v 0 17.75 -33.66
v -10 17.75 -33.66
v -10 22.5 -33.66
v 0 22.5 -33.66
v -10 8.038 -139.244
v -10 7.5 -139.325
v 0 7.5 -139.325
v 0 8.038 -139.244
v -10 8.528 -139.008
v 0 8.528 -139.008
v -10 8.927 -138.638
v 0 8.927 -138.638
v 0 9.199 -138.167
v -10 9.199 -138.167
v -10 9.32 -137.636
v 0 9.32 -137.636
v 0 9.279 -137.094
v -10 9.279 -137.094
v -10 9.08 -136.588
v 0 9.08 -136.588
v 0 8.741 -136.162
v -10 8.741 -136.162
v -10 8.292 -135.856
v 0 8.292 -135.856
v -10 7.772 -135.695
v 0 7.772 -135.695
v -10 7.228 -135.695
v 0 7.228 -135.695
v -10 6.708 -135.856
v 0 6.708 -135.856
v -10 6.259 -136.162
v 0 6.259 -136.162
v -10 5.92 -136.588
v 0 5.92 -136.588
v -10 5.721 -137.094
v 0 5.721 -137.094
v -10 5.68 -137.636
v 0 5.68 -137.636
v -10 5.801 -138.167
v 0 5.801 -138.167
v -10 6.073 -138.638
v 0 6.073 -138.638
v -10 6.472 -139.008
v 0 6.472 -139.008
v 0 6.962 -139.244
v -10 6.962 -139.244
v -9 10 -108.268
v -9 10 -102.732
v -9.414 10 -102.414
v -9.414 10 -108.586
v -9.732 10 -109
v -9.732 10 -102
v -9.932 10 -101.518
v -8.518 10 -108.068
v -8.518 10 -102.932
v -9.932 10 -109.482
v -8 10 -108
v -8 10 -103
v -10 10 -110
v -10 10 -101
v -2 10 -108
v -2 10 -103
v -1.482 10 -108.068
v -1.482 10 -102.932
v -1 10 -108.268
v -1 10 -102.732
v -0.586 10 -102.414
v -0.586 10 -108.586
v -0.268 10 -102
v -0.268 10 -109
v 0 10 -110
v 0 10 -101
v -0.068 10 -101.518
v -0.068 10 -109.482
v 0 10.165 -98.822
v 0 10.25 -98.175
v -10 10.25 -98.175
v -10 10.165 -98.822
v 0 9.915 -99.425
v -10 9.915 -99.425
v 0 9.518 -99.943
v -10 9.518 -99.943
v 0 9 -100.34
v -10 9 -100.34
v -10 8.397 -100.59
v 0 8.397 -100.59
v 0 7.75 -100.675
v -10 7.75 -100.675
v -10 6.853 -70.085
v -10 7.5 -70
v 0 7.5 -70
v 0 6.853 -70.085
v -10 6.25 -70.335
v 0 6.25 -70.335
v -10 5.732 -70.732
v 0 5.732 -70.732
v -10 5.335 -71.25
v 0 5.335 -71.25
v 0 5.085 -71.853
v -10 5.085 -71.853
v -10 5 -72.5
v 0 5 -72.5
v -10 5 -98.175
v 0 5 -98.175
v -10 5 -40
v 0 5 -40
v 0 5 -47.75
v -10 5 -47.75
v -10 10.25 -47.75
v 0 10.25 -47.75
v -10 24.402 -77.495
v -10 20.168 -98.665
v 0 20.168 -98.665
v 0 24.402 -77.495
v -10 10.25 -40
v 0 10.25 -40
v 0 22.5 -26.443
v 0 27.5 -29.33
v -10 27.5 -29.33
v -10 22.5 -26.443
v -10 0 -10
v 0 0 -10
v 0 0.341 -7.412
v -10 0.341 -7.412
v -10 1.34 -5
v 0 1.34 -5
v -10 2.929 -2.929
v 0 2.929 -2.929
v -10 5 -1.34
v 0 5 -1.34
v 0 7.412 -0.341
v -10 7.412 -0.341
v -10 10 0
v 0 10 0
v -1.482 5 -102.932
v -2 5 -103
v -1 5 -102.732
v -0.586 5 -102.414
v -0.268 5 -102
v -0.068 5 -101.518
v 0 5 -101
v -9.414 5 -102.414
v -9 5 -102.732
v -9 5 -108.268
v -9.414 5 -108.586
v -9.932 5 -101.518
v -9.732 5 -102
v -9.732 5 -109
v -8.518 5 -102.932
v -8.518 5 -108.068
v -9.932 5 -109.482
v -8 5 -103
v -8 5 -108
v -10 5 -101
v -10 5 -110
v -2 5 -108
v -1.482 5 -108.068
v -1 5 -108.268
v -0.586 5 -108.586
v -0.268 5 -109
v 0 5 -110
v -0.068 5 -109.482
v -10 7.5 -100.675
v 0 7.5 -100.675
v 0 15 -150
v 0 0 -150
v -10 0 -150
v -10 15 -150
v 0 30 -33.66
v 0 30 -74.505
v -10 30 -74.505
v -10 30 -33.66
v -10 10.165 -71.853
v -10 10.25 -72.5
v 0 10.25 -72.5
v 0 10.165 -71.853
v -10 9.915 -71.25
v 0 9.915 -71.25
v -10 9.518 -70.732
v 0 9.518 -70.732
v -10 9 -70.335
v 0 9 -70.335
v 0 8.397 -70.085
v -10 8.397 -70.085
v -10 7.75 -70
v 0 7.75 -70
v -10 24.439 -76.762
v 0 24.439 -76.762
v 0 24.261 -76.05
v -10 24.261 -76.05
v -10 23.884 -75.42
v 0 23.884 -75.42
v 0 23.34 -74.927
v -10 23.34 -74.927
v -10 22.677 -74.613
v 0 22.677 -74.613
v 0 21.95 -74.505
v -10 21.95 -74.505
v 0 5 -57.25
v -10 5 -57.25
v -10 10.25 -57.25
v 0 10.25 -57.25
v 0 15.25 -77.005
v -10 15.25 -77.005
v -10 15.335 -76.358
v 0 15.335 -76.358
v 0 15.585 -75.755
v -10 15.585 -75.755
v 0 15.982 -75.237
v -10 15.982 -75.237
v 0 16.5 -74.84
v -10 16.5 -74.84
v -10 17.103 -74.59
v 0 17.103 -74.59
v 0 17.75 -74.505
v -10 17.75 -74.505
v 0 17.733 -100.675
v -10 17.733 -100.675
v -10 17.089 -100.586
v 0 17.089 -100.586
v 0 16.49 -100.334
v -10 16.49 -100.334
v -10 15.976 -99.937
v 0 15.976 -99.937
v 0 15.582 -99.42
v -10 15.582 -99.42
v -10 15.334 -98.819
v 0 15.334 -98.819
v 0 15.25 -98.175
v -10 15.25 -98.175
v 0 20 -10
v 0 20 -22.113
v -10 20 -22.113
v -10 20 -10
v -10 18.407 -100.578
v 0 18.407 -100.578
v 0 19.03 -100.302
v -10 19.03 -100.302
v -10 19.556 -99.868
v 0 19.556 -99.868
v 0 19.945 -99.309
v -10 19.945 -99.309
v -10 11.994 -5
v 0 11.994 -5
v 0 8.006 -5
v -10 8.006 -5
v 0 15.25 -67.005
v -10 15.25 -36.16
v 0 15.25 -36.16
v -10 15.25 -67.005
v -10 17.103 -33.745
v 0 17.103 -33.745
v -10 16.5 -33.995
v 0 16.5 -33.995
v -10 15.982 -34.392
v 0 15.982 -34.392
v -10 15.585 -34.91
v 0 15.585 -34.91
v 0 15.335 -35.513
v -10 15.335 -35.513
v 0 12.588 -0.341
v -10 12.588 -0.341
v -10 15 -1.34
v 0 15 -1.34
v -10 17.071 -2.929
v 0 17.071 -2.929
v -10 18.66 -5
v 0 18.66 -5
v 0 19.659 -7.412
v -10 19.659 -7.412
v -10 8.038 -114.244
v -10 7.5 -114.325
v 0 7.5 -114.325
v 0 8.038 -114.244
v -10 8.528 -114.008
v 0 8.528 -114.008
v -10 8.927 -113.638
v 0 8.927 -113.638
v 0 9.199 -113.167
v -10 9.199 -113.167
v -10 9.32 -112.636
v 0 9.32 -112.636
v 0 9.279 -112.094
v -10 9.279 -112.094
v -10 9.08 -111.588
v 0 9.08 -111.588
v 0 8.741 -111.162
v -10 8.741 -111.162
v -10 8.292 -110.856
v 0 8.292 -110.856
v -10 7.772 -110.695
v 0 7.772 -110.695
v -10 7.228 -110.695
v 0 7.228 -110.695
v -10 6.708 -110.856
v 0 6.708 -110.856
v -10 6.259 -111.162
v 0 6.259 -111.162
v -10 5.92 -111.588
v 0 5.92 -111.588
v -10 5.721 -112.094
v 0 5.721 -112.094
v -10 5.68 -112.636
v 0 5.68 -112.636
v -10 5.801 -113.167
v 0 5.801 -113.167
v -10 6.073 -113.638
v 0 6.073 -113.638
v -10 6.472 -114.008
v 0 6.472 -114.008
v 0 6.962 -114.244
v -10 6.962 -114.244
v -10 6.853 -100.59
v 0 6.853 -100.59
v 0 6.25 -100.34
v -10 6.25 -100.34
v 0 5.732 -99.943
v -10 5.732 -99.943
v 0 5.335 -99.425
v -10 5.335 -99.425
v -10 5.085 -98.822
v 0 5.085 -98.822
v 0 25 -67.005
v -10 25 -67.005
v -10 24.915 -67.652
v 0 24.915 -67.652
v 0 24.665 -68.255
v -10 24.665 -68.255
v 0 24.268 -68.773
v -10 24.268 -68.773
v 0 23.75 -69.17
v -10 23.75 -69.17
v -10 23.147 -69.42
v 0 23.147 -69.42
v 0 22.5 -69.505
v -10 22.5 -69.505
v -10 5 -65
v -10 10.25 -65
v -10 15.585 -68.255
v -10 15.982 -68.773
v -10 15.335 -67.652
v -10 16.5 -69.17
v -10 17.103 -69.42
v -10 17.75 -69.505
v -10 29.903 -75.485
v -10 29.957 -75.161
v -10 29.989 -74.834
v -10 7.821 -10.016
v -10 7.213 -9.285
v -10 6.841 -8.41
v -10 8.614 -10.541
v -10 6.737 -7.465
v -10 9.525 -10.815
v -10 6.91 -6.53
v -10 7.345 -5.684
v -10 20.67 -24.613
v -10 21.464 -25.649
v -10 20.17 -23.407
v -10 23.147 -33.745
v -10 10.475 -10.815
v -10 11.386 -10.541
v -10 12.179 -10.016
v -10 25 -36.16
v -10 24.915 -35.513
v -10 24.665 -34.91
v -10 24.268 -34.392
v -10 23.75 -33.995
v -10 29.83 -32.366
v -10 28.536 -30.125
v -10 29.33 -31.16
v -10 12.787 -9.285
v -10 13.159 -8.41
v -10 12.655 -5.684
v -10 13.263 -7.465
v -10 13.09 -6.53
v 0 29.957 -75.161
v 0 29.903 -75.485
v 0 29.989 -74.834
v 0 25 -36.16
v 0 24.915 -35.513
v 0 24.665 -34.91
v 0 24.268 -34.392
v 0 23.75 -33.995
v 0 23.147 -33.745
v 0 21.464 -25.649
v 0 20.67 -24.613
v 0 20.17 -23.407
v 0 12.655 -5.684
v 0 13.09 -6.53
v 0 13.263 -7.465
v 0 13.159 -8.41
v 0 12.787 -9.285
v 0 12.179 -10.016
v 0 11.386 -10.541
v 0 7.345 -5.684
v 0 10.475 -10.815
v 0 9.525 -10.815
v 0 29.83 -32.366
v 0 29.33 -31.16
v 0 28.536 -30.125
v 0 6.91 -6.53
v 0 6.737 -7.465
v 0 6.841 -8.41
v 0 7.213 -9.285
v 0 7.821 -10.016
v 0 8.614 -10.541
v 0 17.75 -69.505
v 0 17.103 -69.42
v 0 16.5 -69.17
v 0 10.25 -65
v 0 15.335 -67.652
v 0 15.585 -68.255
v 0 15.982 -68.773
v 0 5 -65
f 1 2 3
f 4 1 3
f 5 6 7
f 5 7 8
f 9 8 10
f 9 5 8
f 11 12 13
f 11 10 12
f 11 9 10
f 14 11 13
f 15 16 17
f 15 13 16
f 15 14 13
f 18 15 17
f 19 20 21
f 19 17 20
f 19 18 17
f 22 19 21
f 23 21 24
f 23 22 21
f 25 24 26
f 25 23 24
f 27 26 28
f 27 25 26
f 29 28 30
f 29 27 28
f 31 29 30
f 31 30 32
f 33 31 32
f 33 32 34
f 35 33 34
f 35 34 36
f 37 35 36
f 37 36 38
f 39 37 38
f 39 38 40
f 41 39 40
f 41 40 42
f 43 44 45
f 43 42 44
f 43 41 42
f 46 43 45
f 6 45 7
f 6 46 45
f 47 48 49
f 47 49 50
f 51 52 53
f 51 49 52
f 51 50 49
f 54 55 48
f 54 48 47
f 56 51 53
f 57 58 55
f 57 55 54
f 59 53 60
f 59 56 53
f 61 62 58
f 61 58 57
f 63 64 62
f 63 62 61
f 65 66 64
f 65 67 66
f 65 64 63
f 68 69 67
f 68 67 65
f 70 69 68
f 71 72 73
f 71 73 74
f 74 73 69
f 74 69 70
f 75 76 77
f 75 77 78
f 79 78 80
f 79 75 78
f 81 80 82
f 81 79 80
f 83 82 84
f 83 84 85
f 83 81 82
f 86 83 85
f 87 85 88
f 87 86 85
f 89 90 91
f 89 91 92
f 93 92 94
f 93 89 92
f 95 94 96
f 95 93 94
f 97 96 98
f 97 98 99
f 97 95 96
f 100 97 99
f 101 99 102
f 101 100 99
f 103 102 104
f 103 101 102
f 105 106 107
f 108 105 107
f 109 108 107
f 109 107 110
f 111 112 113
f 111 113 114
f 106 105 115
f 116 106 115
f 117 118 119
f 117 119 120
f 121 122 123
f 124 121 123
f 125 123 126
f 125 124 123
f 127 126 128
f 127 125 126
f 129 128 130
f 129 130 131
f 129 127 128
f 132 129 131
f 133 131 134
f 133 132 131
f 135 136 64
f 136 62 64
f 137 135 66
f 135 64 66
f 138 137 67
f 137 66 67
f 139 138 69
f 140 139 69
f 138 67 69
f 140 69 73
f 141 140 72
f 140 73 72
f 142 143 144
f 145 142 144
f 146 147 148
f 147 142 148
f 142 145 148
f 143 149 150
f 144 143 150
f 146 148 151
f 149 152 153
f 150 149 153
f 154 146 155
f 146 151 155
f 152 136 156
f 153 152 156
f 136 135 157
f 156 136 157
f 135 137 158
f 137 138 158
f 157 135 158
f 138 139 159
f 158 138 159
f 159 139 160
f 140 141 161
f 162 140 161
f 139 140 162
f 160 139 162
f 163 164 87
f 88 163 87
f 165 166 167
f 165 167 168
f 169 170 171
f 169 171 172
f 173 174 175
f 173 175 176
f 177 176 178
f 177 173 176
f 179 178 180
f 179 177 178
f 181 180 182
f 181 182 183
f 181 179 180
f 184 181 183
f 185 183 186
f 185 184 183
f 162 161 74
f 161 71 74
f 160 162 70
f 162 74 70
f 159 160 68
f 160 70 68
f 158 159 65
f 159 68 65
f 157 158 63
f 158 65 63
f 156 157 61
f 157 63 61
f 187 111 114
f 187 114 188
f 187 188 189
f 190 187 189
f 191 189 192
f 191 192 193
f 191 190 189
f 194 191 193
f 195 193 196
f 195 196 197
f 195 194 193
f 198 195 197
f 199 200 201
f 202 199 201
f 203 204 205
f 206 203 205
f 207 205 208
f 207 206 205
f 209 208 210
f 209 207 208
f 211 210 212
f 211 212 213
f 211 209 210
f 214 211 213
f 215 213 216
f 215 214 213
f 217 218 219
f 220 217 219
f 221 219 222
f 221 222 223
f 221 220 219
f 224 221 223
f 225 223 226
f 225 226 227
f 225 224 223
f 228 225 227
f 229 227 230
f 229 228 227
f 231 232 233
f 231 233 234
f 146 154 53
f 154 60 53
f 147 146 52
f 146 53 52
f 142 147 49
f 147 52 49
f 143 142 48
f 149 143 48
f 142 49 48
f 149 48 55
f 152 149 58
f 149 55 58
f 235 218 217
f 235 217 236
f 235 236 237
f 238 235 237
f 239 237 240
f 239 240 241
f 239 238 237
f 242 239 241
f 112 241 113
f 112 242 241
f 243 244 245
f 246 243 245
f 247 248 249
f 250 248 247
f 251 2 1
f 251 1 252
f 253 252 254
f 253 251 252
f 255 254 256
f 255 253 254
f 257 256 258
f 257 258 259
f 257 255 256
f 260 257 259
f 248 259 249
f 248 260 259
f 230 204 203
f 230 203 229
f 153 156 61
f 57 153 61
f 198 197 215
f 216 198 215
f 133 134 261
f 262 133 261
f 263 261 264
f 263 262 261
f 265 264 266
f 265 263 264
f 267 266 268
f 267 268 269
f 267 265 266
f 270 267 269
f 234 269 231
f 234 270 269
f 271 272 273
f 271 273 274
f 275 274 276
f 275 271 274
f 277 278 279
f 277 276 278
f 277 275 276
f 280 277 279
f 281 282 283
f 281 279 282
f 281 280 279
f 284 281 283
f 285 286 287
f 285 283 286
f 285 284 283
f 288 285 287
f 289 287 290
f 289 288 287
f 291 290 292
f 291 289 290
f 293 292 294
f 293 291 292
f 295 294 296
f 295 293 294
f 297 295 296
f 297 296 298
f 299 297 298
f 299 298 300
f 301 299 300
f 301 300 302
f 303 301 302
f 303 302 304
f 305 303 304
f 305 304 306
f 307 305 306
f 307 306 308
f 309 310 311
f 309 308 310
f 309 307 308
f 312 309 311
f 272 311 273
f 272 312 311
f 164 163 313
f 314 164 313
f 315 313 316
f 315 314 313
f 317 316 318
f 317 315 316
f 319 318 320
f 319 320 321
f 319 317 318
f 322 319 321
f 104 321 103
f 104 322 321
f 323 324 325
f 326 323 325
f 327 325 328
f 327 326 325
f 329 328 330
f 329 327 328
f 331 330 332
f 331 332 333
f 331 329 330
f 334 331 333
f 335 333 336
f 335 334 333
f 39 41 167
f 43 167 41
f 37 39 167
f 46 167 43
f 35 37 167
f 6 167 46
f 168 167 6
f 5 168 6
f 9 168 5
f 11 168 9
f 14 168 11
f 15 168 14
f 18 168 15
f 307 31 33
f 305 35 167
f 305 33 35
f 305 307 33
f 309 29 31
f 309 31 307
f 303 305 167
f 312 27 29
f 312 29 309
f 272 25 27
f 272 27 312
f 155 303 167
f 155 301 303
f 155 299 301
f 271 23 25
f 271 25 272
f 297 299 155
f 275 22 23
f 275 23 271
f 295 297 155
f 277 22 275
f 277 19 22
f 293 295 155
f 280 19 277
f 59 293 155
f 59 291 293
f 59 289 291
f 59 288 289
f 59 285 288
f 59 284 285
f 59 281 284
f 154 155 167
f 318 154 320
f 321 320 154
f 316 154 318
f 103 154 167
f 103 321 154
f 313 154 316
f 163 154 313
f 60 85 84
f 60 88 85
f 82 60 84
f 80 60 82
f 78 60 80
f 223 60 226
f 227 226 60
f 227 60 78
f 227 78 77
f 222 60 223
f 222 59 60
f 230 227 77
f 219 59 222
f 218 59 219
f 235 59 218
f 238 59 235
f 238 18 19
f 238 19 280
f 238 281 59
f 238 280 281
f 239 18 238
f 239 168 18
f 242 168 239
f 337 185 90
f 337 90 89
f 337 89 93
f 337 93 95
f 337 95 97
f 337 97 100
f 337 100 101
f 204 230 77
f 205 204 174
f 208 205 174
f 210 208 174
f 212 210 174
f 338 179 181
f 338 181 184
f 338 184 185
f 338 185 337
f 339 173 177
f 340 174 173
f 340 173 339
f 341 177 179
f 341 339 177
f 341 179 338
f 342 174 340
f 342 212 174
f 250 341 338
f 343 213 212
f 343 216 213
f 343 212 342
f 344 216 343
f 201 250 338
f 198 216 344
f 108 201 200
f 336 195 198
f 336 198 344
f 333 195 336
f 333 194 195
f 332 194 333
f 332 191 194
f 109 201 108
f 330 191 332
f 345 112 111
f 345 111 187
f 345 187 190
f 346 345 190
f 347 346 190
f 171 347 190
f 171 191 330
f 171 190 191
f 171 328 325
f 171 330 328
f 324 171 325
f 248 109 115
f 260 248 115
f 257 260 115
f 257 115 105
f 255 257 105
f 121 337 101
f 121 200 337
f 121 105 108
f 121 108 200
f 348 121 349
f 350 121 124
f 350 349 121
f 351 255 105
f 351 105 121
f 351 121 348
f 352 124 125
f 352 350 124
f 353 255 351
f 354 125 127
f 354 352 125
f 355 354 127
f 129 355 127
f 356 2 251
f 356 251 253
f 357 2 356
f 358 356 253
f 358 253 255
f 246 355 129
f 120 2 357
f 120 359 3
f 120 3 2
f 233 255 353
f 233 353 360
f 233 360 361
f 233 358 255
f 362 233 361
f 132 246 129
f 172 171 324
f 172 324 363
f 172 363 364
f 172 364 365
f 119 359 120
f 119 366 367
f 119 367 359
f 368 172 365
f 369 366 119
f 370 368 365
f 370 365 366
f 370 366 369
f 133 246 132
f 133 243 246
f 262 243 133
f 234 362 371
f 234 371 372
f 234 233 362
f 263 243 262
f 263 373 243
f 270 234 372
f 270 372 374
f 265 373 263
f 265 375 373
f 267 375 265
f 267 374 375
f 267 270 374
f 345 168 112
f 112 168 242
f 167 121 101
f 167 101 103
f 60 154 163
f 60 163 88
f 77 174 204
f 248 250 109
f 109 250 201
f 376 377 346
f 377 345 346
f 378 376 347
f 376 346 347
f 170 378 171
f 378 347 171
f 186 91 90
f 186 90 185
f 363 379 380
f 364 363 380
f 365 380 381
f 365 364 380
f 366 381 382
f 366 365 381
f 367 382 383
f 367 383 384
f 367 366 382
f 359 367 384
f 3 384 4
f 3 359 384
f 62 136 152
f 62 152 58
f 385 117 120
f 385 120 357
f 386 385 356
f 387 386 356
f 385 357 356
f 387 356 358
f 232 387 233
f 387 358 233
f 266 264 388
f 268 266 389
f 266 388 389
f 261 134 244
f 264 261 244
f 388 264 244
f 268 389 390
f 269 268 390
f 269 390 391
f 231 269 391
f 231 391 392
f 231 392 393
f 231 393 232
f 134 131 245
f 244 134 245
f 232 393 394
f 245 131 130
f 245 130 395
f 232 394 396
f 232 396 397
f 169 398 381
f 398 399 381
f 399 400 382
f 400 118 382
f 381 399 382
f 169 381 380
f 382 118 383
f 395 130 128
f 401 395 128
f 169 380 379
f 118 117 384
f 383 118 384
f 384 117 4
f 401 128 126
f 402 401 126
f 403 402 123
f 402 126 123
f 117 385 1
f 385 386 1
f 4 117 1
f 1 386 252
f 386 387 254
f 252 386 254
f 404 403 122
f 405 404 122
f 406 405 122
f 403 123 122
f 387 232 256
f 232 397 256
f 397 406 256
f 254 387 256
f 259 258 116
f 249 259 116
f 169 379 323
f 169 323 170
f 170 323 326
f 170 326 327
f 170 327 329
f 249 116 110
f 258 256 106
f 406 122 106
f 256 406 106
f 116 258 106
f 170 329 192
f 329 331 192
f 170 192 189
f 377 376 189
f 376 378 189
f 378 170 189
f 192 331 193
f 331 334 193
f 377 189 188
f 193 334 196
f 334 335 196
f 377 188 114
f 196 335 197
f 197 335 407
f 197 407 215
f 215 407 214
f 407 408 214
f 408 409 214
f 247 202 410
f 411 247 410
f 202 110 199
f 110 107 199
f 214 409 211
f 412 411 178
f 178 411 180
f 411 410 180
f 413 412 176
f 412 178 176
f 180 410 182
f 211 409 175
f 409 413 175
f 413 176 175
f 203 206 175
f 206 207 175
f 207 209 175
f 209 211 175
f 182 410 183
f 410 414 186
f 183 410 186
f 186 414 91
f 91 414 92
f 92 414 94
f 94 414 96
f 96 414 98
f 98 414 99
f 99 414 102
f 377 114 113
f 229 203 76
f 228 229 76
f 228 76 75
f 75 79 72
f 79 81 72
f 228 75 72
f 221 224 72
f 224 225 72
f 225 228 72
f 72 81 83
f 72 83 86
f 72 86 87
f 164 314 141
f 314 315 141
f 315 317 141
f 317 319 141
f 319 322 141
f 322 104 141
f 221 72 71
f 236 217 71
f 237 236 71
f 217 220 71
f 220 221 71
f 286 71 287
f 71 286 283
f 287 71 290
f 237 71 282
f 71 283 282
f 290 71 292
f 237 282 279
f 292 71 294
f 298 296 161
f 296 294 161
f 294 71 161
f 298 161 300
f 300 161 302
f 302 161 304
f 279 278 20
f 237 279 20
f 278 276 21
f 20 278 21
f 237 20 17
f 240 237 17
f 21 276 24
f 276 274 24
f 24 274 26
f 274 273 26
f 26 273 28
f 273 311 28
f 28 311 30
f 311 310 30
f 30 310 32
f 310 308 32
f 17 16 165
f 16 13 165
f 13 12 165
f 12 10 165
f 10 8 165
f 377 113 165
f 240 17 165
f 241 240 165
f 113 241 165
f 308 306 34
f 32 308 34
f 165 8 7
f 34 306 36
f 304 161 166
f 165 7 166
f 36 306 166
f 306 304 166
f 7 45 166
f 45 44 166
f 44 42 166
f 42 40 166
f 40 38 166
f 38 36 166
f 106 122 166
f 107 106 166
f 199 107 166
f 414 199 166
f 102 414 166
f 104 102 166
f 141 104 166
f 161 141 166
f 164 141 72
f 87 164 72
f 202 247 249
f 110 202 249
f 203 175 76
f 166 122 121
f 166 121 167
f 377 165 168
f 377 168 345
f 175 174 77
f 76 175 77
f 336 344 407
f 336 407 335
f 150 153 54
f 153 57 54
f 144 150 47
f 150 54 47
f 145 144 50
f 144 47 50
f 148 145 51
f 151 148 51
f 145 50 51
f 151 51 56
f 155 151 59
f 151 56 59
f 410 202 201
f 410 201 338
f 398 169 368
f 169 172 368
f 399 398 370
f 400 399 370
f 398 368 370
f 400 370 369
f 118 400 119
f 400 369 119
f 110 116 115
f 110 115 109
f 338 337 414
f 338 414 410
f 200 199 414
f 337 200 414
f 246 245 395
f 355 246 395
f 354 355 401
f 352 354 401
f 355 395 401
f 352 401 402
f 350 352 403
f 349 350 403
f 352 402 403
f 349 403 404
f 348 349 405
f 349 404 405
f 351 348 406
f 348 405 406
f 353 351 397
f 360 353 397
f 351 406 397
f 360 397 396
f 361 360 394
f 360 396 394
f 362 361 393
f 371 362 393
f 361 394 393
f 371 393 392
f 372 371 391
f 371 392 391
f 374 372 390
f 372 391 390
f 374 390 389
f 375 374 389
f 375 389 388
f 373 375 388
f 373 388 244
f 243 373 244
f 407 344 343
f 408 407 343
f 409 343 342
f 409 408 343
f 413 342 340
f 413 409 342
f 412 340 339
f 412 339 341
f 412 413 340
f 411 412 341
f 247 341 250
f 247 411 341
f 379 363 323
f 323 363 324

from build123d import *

# Parameters (mm, degrees)
BOSS_EXTRUDE1_DEPTH     = 10
CUT_EXTRUDE2_DEPTH      = 154.297097168
FILLET1_R               = 10
FILLET2_R               = 5
CUT_EXTRUDE3_DEPTH      = 154.297097168
CUT_EXTRUDE3_DEPTH_BACK = 154.297097168
SKETCH3_W               = 7.75
SKETCH3_H               = 5.25
CUT_EXTRUDE6_DEPTH      = 154.297097168
CUT_EXTRUDE6_DEPTH_BACK = 154.297097168
SKETCH6_R               = 1.825
FILLET3_R               = 5
CUT_EXTRUDE7_DEPTH      = 154.297097168
CUT_EXTRUDE7_DEPTH_BACK = 154.297097168
SKETCH7_W               = 35.844648394
SKETCH7_H               = 9.75
SKETCH7_W_2             = 30.675
SKETCH7_H_2             = 5.25
FILLET4_R               = 2.5
SKETCH8_W               = 5
SKETCH8_H               = 5
CUT_EXTRUDE8_DEPTH      = 10
FILLET5_R               = 2
FILLET6_R               = 2
FILLET7_R               = 2
FILLET8_R               = 2


# Some blends are built 0.0001 mm under size
with BuildPart() as part:
    # Sketch1 → Boss-Extrude1 (new body)
    with BuildSketch(Plane(origin=(0, 0, 0), x_dir=(0, 0, -1), z_dir=(1, 0, 0))):
        Polygon((0, 0), (150, 0), (150, 15), (75, 30), (30.773502692, 30), (25, 20), (0, 20), align=None)
    extrude(amount=-BOSS_EXTRUDE1_DEPTH)

    # Sketch2 → Cut-Extrude2 (cut, through all)
    with BuildSketch(Plane(origin=(0, 0, 0), x_dir=(0, 0, -1), z_dir=(1, 0, 0))):
        with BuildLine():
            Line((5, 11.994492417), (5, 8.005507583))
            ThreePointArc((5, 8.005507583), (10.85, 10), (5, 11.994492417))
        make_face()
    extrude(amount=-CUT_EXTRUDE2_DEPTH, mode=Mode.SUBTRACT)

    # Fillet1
    fillet1_edges = [part.edges().sort_by_distance(p)[0] for p in [
        (-5, 0, 0),
        (-5, 20, 0),
    ]]
    fillet(fillet1_edges, radius=FILLET1_R - 0.0001)  # a hair under: the kernel refuses the full size

    # Fillet2
    fillet2_edges = [part.edges().sort_by_distance(p)[0] for p in [
        (-5, 30, -30.773502692),
        (-5, 30, -75),
    ]]
    fillet(fillet2_edges, radius=FILLET2_R)

    # Sketch3 → Cut-Extrude3 (cut, two sides: drawn at the far end of the back side and taken through both)
    with BuildSketch(Plane(origin=(0, 0, 0), x_dir=(0, 0, -1), z_dir=(1, 0, 0)).offset(-CUT_EXTRUDE3_DEPTH_BACK)):
        with Locations((61.125, 7.625)):
            Rectangle(SKETCH3_W, SKETCH3_H)
        with Locations((43.875, 7.625)):
            Rectangle(SKETCH3_W, SKETCH3_H)
    extrude(amount=CUT_EXTRUDE3_DEPTH + CUT_EXTRUDE3_DEPTH_BACK, mode=Mode.SUBTRACT)

    # Sketch6 → Cut-Extrude6 (cut, two sides: drawn at the far end of the back side and taken through both)
    with BuildSketch(Plane(origin=(0, 0, 0), x_dir=(0, 0, -1), z_dir=(1, 0, 0)).offset(-CUT_EXTRUDE6_DEPTH_BACK)):
        with Locations((112.5, 7.5)):
            Circle(SKETCH6_R)
        with Locations((137.5, 7.5)):
            Circle(SKETCH6_R)
    extrude(amount=CUT_EXTRUDE6_DEPTH + CUT_EXTRUDE6_DEPTH_BACK, mode=Mode.SUBTRACT)

    # Fillet3
    fillet3_edges = [part.edges().sort_by_distance(p)[0] for p in [
        (-5, 20, -25),
    ]]
    fillet(fillet3_edges, radius=FILLET3_R)

    # Sketch7 → Cut-Extrude7 (cut, two sides: drawn at the far end of the back side and taken through both)
    with BuildSketch(Plane(origin=(0, 0, 0), x_dir=(0, 0, -1), z_dir=(1, 0, 0)).offset(-CUT_EXTRUDE7_DEPTH_BACK)):
        with Locations((51.582578235, 20.125)):
            Rectangle(SKETCH7_W, SKETCH7_H)
        with Locations((85.3375, 7.625)):
            Rectangle(SKETCH7_W_2, SKETCH7_H_2)
        Polygon((100.675, 15.25), (100.675, 19.765980486), (74.504902432, 25), (74.504902432, 15.25), align=None)
    extrude(amount=CUT_EXTRUDE7_DEPTH + CUT_EXTRUDE7_DEPTH_BACK, mode=Mode.SUBTRACT)

    # Fillet4
    # the kernel refuses this fillet: 2.5 mm, written as the material it adds along each edge
    with BuildSketch(Plane(origin=(0, 15.25, -69.504902432), x_dir=(0, 0, 1), z_dir=(-1, 0, 0)), Plane(origin=(-10, 25, -33.660254038), x_dir=(0, -1, 0), z_dir=(1, 0, 0)), Plane(origin=(0, 25, -69.504902432), x_dir=(0, -1, 0), z_dir=(-1, 0, 0)), Plane(origin=(0, 15.25, -74.504902432), x_dir=(0, 1, 0), z_dir=(-1, 0, 0)), Plane(origin=(0, 15.25, -100.675), x_dir=(0, 0, 1), z_dir=(-1, 0, 0)), Plane(origin=(0, 5, -100.675), x_dir=(0, 0, 1), z_dir=(-1, 0, 0))) as fillet4_piece_1:
        with BuildLine():
            CenterArc((FILLET4_R, FILLET4_R), FILLET4_R, 180, 90)
            Line((0, FILLET4_R), (0, 0))
            Line((0, 0), (FILLET4_R, 0))
        make_face()
    extrude(amount=10)
    with BuildSketch(Plane(origin=(-10, 15.25, -33.660254038), x_dir=(0, 1, 0), z_dir=(1, 0, 0)), Plane(origin=(-10, 5, -70), x_dir=(0, 1, 0), z_dir=(1, 0, 0)), Plane(origin=(-10, 10.25, -70), x_dir=(0, 0, -1), z_dir=(1, 0, 0)), Plane(origin=(0, 10.25, -100.675), x_dir=(0, 0, 1), z_dir=(-1, 0, 0))) as fillet4_piece_2:
        with BuildLine():
            CenterArc((FILLET4_R, -FILLET4_R), FILLET4_R, 90, 90)
            Line((0, -FILLET4_R), (0, 0))
            Line((0, 0), (FILLET4_R, 0))
        make_face()
    extrude(amount=10)
    with BuildSketch(Plane(origin=(-10, 25, -74.504902432), x_dir=(0, -0.1961161351381845, -0.9805806756909201), z_dir=(1, 0, 0))) as fillet4_piece_3:
        with BuildLine():
            CenterArc((FILLET4_R * 1.21980390272, -FILLET4_R), FILLET4_R, 90, 101.309932474)
            Line((FILLET4_R * 0.239223227028, -FILLET4_R * 1.19611613514), (0, 0))
            Line((0, 0), (FILLET4_R * 1.21980390272, 0))
        make_face()
    extrude(amount=10)
    with BuildSketch(Plane(origin=(-10, 19.765980486, -100.675), x_dir=(0, 0.19611613513818169, 0.9805806756909206), z_dir=(1, 0, 0))) as fillet4_piece_4:
        with BuildLine():
            CenterArc((FILLET4_R * 0.819803902719, FILLET4_R), FILLET4_R, 191.309932474, 78.690067526)
            Line((-FILLET4_R * 0.160776772972, FILLET4_R * 0.803883864862), (0, 0))
            Line((0, 0), (FILLET4_R * 0.819803902719, 0))
        make_face()
    extrude(amount=10)

    # Sketch8 → Cut-Extrude8 (cut)
    with BuildSketch(Plane(origin=(0, 0, 0), x_dir=(0, 0, -1), z_dir=(1, 0, 0))):
        with Locations((105.5, 7.5)):
            Rectangle(SKETCH8_W, SKETCH8_H)
    extrude(amount=-CUT_EXTRUDE8_DEPTH, mode=Mode.SUBTRACT)

    # Fillet5
    fillet5_edges = [part.edges().sort_by_distance(p)[0] for p in [
        (0, 7.5, -103),
    ]]
    fillet(fillet5_edges, radius=FILLET5_R)

    # Fillet6
    fillet6_edges = [part.edges().sort_by_distance(p)[0] for p in [
        (-10, 7.5, -108),
    ]]
    fillet(fillet6_edges, radius=FILLET6_R)

    # Fillet7
    fillet7_edges = [part.edges().sort_by_distance(p)[0] for p in [
        (-10, 7.5, -103),
    ]]
    fillet(fillet7_edges, radius=FILLET7_R)

    # Fillet8
    fillet8_edges = [part.edges().sort_by_distance(p)[0] for p in [
        (0, 7.5, -108),
    ]]
    fillet(fillet8_edges, radius=FILLET8_R)


solid = part.part
